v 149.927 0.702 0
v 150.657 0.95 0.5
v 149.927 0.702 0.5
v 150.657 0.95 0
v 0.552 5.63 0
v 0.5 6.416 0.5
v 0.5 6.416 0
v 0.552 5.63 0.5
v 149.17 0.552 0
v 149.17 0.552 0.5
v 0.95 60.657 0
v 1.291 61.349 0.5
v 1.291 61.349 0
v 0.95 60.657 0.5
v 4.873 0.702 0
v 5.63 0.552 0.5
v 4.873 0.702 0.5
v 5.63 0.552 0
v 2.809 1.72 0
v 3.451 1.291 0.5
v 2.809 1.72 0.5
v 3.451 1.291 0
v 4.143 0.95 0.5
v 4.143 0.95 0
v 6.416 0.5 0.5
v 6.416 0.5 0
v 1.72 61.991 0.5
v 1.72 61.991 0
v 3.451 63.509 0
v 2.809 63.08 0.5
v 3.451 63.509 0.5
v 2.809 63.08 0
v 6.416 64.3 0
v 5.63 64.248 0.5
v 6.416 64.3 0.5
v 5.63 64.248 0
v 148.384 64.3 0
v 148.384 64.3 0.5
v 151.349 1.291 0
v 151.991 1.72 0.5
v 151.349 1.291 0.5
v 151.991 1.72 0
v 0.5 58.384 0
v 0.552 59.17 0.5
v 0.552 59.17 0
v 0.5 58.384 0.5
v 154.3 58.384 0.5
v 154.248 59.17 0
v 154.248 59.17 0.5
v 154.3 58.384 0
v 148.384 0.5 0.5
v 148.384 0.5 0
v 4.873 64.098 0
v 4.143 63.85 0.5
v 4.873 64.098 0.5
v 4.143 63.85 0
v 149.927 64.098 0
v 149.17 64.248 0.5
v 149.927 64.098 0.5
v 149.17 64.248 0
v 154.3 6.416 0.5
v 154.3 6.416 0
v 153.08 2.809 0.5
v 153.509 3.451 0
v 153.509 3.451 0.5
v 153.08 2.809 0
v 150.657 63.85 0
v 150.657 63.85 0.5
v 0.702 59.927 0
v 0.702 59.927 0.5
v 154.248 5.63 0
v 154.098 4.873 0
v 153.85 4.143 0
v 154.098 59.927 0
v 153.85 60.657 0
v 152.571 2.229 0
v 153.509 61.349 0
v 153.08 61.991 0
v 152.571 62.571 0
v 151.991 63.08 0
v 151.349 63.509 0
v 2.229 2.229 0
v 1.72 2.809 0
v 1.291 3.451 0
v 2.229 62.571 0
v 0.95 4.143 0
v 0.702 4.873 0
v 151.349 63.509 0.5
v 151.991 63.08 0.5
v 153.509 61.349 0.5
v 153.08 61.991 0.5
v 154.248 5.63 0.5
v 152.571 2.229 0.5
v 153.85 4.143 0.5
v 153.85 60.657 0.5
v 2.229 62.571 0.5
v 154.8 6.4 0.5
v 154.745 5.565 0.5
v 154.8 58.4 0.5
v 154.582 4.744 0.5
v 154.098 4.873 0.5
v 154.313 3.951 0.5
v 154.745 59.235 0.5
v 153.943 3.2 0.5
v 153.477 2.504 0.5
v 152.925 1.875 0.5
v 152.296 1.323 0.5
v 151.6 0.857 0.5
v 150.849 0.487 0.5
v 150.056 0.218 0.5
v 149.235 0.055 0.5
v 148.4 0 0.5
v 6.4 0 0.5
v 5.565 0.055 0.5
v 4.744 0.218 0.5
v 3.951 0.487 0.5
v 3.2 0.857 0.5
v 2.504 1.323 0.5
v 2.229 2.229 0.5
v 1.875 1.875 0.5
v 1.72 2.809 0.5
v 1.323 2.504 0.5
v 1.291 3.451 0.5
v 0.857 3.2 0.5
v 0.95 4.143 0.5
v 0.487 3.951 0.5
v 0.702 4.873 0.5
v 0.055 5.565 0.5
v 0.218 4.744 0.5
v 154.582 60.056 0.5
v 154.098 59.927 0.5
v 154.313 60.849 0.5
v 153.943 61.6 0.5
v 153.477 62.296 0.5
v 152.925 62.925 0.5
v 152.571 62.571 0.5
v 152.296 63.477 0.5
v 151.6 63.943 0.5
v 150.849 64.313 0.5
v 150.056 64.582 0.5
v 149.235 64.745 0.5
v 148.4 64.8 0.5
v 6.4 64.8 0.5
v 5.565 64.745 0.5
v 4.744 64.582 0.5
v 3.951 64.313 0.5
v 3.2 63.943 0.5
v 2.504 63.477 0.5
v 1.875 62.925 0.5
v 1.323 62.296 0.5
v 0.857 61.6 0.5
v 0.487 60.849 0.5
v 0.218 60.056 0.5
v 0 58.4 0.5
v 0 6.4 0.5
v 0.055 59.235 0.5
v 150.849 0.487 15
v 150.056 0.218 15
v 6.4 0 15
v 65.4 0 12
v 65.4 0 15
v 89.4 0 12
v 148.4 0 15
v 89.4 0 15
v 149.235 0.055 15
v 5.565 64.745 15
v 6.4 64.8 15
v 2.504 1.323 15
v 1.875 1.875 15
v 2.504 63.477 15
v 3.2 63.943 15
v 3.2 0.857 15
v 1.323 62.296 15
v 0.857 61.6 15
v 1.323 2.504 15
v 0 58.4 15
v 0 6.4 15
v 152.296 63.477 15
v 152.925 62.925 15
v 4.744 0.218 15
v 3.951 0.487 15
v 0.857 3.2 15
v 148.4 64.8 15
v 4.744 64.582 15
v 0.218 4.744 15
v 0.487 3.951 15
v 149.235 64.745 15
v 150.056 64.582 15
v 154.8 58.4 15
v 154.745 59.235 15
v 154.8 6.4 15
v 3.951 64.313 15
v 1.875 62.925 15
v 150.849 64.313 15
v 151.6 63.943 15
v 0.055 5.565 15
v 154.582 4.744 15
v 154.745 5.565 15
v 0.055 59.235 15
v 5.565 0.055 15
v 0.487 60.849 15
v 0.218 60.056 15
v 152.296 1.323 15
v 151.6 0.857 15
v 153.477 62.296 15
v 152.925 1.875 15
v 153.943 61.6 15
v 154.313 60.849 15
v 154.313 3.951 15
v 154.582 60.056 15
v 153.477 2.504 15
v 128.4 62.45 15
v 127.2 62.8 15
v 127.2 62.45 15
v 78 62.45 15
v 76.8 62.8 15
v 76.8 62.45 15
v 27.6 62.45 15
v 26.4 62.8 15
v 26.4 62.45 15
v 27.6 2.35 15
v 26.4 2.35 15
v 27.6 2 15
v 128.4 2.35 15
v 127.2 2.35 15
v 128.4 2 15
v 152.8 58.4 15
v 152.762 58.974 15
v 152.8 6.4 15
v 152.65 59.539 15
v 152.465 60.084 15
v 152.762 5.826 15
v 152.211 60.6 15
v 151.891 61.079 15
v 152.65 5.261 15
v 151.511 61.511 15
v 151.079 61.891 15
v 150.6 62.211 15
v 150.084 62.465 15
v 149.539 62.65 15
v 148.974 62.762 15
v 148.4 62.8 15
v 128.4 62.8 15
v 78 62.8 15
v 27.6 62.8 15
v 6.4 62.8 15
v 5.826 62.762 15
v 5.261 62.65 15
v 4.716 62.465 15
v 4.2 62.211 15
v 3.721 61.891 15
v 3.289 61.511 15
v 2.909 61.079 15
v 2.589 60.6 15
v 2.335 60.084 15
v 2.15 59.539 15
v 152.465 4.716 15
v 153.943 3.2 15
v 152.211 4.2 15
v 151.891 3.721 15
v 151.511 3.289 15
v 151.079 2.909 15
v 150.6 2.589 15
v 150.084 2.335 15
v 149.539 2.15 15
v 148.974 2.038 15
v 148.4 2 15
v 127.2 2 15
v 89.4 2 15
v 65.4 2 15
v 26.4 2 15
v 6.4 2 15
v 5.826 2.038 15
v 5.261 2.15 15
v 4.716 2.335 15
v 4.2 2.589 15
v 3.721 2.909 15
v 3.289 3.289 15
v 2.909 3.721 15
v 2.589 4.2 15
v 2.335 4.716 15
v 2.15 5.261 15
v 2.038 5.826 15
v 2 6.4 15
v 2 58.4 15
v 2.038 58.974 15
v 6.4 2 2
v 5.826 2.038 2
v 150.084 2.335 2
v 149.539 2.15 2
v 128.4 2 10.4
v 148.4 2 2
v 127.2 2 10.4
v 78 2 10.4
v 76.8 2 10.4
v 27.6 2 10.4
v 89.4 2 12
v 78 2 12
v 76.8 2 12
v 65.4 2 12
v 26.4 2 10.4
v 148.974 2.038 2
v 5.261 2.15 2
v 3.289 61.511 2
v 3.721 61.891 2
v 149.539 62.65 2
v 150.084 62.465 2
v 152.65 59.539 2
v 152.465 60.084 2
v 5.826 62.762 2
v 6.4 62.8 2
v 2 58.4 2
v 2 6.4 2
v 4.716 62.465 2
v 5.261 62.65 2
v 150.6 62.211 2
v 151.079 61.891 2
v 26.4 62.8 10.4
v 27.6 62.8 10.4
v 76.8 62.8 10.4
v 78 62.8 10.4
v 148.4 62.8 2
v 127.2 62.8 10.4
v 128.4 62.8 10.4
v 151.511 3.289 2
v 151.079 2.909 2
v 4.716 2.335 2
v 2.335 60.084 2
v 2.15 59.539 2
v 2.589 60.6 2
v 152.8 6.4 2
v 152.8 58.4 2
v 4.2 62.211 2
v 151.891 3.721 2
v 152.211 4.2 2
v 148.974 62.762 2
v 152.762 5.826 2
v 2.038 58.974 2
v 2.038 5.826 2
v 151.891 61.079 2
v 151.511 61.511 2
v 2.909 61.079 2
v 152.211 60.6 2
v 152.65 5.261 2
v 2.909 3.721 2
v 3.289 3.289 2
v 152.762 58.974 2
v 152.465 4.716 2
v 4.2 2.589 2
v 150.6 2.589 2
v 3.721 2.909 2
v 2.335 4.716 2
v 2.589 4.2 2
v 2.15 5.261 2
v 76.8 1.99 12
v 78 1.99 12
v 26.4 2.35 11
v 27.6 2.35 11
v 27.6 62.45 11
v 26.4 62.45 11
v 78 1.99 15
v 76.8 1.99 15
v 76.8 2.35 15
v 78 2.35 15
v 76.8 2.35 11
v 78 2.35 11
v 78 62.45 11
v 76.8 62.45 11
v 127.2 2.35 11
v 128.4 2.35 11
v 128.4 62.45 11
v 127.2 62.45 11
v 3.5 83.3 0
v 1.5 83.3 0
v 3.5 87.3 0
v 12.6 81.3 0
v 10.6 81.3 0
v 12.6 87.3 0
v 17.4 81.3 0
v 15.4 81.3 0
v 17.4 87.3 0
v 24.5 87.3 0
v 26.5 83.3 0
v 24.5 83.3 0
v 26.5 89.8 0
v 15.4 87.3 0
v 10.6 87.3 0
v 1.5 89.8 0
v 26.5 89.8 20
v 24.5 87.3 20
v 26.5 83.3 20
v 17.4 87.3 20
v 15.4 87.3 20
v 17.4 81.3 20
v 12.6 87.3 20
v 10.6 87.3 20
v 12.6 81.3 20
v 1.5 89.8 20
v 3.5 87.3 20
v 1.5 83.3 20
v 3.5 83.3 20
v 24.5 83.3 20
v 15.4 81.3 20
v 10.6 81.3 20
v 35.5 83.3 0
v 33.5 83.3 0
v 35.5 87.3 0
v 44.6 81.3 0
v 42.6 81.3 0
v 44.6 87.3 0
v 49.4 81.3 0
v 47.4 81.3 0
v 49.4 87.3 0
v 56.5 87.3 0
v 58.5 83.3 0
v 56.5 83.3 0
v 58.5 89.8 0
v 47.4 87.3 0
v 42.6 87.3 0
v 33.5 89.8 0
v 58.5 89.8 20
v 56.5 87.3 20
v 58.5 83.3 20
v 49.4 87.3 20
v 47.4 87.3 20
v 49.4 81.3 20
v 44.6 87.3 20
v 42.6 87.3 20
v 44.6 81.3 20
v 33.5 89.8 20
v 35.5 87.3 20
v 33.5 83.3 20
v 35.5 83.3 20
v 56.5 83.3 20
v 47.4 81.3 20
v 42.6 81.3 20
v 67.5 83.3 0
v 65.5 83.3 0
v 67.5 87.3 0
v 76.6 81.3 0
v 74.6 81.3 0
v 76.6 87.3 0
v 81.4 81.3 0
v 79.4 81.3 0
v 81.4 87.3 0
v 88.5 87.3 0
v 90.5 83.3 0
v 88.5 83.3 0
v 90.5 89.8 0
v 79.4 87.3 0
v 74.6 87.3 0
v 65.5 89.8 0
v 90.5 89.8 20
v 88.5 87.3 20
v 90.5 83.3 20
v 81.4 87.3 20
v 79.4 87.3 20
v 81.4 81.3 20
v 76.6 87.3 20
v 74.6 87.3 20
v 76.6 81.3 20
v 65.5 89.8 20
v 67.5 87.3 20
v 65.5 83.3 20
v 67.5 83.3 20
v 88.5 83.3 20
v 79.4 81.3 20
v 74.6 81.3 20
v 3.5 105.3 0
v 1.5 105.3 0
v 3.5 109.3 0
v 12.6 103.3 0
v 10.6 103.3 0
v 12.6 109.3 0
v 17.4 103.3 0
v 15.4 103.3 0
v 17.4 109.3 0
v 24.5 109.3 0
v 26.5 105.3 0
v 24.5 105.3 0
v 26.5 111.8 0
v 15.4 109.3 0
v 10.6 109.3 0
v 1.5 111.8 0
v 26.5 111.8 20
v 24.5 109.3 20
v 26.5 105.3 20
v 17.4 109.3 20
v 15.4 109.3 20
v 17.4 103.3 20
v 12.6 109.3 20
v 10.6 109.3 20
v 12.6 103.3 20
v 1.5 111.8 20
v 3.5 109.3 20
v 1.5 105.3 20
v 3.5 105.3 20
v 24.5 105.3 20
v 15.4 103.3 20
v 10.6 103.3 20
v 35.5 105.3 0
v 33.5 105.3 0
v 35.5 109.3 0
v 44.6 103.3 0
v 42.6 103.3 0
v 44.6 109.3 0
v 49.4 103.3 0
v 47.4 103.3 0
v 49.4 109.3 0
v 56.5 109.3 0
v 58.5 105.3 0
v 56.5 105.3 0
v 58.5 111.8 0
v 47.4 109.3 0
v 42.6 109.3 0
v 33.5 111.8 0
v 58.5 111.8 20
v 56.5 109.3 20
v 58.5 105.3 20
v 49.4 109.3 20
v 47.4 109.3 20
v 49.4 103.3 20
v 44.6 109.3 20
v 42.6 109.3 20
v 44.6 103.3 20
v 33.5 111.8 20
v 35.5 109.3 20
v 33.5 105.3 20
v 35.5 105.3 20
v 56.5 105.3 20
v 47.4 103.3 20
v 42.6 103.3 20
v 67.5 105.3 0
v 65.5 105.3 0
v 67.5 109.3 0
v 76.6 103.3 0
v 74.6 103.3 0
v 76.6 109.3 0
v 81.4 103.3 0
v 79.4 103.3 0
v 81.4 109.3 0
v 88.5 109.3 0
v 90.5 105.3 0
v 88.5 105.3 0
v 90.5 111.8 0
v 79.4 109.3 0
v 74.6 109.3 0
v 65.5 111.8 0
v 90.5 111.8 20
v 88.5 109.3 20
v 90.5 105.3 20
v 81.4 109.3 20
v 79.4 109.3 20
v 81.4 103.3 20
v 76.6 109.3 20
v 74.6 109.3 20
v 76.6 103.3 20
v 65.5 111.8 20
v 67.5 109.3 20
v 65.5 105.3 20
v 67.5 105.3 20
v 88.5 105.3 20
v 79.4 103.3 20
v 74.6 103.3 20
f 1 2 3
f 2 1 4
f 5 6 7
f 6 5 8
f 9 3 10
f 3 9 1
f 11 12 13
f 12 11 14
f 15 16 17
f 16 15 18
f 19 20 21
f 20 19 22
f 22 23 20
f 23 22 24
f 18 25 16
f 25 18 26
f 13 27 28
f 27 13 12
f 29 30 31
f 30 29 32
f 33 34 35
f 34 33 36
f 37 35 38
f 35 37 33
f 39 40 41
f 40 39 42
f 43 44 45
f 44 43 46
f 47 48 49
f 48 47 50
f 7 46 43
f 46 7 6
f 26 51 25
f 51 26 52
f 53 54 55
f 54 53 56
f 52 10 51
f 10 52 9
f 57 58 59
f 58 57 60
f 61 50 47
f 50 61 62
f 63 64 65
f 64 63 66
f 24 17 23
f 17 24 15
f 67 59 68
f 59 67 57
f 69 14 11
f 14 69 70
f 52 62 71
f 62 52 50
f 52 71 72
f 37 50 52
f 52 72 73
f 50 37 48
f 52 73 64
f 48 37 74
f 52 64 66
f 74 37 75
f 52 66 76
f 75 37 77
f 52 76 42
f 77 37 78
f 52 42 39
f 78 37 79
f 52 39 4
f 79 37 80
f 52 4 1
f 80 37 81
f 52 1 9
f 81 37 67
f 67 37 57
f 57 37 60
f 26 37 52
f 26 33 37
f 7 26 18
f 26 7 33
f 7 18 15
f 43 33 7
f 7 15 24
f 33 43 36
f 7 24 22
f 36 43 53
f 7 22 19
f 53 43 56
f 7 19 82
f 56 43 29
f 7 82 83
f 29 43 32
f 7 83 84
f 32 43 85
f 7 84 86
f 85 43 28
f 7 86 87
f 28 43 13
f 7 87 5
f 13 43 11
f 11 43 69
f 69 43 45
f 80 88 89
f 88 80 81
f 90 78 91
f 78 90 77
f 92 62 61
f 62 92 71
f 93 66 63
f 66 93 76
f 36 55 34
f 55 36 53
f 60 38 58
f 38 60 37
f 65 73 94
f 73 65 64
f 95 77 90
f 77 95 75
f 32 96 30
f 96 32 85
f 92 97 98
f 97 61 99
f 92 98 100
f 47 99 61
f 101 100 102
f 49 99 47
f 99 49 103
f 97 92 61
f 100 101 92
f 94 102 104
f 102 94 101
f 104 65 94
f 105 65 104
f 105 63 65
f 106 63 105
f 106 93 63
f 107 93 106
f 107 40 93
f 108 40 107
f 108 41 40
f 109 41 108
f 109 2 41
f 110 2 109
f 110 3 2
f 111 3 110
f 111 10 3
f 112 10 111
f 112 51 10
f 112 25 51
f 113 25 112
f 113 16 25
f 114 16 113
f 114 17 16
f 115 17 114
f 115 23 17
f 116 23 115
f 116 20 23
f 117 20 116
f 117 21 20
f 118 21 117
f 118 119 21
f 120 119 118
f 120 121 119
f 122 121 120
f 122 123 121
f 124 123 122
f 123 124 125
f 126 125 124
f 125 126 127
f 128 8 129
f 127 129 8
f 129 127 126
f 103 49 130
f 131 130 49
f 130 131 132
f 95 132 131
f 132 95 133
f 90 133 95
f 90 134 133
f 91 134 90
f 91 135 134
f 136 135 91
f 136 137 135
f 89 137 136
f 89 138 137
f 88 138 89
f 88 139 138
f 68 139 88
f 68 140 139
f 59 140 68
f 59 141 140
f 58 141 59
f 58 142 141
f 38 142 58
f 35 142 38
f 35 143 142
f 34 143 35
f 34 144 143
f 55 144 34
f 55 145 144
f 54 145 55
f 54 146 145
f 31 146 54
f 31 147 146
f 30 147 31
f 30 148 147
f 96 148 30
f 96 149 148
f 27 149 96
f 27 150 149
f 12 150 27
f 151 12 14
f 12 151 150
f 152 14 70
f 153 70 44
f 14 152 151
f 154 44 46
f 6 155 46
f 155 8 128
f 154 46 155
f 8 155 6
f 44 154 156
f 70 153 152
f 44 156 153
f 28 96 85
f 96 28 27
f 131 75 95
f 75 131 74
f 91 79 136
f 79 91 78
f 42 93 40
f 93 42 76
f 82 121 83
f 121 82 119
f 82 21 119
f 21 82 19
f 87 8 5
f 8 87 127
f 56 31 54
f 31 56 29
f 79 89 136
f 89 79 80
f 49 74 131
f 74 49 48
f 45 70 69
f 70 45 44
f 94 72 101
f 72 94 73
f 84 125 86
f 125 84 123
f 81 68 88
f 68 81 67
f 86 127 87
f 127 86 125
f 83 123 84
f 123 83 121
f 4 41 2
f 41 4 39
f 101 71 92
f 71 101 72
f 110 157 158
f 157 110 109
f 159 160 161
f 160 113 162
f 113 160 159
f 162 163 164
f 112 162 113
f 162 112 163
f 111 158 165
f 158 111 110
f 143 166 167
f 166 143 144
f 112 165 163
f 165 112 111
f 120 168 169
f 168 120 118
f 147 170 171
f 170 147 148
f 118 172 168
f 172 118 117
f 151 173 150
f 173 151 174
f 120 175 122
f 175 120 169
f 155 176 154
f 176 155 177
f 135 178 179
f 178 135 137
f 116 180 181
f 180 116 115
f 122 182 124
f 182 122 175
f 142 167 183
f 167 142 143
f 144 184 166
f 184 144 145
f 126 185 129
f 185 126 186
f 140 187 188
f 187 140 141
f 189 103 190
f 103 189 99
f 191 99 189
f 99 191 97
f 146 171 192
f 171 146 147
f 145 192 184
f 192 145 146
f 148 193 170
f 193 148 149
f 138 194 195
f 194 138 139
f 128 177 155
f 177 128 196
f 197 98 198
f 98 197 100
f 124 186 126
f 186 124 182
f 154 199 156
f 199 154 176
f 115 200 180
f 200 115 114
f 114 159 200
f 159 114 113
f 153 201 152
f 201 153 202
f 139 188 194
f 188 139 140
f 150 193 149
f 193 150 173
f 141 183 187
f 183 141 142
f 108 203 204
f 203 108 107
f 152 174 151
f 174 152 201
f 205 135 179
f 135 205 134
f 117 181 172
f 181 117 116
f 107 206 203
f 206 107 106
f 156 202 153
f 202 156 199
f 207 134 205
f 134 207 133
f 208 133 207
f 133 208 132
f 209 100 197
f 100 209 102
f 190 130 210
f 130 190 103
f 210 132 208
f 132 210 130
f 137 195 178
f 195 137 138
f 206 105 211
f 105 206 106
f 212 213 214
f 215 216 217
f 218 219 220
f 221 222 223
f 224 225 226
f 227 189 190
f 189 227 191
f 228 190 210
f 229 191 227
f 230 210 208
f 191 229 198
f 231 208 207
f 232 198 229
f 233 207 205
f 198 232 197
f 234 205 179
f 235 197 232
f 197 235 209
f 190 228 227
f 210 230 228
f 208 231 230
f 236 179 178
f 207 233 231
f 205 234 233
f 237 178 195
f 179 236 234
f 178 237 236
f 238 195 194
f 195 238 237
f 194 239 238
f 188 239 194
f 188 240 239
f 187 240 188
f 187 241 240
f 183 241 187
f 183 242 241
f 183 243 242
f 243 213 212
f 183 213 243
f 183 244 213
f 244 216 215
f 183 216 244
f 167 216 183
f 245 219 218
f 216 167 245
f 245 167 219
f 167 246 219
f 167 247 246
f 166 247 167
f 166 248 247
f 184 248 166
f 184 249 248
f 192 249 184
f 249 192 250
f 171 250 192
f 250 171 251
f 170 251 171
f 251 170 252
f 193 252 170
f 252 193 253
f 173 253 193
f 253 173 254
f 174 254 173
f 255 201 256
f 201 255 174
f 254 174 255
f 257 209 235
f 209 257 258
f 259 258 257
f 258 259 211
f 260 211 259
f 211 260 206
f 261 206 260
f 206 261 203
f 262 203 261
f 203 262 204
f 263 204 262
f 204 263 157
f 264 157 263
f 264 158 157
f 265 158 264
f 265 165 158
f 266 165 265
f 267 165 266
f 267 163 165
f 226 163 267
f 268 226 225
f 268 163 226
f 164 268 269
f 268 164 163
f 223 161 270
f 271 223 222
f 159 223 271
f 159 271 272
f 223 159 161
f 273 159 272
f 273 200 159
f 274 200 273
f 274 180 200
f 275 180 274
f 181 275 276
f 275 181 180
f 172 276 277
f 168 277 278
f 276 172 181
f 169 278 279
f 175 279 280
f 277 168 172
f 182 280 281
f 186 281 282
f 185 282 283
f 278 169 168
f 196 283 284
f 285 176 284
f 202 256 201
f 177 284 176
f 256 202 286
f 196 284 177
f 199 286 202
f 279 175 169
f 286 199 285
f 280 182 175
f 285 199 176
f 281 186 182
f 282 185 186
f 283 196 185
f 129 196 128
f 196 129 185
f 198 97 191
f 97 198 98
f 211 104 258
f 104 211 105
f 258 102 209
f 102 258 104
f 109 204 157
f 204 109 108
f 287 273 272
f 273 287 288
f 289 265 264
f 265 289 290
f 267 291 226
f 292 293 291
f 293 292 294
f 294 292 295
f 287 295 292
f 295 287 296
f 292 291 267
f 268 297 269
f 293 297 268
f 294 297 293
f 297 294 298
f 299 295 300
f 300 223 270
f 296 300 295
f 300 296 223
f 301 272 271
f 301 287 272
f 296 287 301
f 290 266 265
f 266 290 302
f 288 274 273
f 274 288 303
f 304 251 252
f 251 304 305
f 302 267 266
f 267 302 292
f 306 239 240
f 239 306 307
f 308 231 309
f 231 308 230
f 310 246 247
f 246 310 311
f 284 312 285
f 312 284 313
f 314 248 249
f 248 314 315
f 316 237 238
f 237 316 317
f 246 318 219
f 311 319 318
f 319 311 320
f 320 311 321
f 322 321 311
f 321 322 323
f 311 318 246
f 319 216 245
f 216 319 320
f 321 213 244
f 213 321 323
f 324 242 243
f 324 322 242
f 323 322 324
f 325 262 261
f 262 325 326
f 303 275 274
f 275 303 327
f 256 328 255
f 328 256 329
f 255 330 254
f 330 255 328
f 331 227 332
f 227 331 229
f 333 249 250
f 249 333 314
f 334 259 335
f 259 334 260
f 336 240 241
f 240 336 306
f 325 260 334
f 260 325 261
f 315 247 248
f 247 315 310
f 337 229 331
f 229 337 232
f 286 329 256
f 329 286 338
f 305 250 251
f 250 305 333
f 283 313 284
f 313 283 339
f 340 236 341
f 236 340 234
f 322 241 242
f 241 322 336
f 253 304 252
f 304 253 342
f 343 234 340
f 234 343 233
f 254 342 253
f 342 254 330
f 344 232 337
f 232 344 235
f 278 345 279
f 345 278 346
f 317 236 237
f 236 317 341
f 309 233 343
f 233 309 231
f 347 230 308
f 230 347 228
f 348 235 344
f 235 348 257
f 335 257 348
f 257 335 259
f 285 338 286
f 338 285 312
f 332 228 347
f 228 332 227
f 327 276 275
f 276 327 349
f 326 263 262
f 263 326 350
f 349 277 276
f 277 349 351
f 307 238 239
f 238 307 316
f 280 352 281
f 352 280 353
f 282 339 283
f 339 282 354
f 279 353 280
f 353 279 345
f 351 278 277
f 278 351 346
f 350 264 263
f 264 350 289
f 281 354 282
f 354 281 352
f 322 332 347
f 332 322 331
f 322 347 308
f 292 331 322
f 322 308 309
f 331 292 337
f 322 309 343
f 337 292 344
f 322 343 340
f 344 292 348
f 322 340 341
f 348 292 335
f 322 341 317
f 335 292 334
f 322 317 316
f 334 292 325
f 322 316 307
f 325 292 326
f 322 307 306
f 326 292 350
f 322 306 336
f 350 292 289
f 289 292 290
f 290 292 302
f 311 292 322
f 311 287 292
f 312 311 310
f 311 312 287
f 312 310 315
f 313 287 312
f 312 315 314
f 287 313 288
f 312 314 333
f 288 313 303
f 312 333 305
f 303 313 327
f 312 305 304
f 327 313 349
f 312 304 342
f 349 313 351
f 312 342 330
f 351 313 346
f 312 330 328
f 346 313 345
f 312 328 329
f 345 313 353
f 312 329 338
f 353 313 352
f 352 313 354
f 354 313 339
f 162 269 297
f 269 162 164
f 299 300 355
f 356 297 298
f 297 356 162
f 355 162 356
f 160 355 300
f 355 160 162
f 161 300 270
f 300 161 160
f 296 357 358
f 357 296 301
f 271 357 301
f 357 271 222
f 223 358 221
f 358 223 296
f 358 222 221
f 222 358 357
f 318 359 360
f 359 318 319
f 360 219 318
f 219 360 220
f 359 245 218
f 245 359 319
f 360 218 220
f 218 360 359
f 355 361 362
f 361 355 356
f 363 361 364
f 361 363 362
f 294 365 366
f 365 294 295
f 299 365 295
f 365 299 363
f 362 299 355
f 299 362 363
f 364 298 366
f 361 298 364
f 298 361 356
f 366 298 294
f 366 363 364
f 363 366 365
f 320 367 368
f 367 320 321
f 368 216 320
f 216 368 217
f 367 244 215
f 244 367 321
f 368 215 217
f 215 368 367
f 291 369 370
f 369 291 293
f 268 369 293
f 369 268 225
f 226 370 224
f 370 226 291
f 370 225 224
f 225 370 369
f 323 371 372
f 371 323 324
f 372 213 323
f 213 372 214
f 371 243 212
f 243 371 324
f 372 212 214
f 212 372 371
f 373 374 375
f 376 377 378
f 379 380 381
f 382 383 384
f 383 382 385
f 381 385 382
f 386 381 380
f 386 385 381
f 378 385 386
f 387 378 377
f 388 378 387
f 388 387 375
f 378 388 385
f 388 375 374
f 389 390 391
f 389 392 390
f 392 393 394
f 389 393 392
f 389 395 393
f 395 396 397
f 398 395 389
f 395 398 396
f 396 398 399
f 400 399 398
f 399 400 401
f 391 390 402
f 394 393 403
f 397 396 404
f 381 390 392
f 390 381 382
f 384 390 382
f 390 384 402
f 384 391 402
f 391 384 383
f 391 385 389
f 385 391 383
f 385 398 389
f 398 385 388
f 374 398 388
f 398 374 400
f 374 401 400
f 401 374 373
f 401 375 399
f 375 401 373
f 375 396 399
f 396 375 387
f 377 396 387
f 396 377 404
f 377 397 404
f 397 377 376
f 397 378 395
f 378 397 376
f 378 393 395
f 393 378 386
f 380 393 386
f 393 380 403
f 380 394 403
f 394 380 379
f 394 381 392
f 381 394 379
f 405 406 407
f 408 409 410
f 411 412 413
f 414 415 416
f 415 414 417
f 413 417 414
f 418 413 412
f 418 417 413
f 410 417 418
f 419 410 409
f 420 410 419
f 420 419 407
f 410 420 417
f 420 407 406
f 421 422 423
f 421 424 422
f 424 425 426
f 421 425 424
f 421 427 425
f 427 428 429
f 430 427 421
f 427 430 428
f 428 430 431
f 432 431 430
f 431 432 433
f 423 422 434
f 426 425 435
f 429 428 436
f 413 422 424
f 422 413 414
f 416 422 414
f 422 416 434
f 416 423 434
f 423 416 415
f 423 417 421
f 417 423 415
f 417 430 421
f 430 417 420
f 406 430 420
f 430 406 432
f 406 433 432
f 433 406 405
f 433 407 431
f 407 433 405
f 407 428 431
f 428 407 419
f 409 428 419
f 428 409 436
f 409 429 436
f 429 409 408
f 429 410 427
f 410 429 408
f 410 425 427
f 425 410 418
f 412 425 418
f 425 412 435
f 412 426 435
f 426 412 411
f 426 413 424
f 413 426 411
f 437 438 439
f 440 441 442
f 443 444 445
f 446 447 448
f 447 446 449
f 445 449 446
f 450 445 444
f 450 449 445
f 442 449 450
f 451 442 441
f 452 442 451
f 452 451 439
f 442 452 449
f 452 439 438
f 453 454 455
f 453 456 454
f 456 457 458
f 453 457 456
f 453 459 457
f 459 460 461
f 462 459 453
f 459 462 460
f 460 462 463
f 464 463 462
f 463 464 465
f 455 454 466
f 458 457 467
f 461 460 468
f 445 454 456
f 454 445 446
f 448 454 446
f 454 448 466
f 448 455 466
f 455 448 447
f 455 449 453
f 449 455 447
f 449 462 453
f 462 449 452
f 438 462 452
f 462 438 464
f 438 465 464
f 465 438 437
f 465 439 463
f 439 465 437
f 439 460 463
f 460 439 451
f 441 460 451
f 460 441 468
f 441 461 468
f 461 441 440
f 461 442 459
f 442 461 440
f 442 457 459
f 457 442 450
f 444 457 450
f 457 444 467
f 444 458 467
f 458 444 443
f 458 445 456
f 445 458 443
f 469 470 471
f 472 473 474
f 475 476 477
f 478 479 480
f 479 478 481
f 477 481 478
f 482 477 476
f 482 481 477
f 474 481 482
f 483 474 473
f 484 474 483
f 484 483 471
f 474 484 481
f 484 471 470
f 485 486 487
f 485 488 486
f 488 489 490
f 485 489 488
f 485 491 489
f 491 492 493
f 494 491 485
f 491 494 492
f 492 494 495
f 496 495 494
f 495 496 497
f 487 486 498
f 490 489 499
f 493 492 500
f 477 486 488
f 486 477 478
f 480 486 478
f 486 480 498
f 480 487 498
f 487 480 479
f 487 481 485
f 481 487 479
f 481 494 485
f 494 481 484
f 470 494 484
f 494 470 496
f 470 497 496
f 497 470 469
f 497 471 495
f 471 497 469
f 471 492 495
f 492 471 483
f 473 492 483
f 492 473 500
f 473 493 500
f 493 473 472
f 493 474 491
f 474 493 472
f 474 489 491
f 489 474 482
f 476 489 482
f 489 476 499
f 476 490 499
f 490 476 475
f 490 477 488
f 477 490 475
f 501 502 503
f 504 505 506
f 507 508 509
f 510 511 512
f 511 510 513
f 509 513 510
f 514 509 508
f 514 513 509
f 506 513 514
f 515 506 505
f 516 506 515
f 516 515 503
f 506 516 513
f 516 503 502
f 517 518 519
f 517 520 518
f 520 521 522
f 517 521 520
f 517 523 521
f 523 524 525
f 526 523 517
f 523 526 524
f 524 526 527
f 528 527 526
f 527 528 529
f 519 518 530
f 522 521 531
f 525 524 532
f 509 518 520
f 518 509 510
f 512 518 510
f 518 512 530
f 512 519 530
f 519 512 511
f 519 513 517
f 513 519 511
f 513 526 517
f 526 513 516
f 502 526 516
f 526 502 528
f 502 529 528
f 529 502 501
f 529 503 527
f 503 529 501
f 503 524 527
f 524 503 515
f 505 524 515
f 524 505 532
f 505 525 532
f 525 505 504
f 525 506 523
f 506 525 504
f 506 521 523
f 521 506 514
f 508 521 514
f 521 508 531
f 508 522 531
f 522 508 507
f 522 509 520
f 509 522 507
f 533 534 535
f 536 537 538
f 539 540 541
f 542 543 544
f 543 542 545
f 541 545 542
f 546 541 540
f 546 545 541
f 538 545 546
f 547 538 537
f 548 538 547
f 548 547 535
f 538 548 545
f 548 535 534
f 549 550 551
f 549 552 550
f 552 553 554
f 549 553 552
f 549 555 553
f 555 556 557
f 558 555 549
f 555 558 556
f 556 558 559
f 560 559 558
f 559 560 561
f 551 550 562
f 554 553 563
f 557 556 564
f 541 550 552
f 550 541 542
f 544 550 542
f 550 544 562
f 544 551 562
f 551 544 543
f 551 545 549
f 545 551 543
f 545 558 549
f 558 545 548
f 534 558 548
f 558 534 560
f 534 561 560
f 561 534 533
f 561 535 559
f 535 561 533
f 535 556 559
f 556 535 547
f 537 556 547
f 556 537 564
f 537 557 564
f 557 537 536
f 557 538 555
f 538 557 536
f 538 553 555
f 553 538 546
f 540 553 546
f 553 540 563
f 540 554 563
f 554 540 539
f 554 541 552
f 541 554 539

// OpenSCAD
// file: params.scad
// ===========================================================================
//  Apache 4800 cyberdeck v2 - shared parameters (all mm)
//  Every part file includes this through parts.scad.
//  Values marked [CHECK] are defaults from the spec: measure the real part and
//  change them here, then run build.cmd again to re-export every STL.
// ===========================================================================

// ---- printer limits --------------------------------------------------------
bed_max    = 175;      // max footprint X and Y
height_max = 150;

// ---- case: Harbor Freight Apache 4800 ---------------------------------------
case_in      = [454, 327];  // interior at the rim (listed)
tray         = [444, 312];  // [CHECK] printed tray outline = floor at the very bottom
tray_r       = 20;          // [CHECK] inside corner radius
base_depth   = 115;         // [CHECK] floor to rim
lid_depth    = 44;          // [CHECK]
height_limit = 100;         // nothing in the base taller than this above the floor

// ---- floor tiles (3 x 2) -----------------------------------------------------
tile_cols = 3;
tile_rows = 2;
tile_t    = 4;
tile_gap  = 0.4;                       // total gap between neighbouring tiles
tile_sz   = [tray[0] / tile_cols, tray[1] / tile_rows];   // 148 x 156
vent_sz     = 15;
vent_pitch  = 25;
vent_margin = 8;                       // keep vents this far from tile edges
chamfer     = 0.5;                     // bottom-edge chamfer (elephant foot)

// ---- tile joints (dovetail tabs printed on the tiles - no loose keys) -------
tab_neck  = 10;      // width where the tab leaves its tile
tab_head  = 16;      // width at the tip (wider = locks)
tab_len   = 10;      // how far it reaches into the next tile
tab_clear = 0.2;     // gap around the tab in the socket (per side); raise if too tight

// ---- Velcro straps ------------------------------------------------------------
strap_w      = 22;   // slot length (20 mm strap + room)
strap_slot_t = 3.5;  // slot width
strap_groove = 1.6;  // groove depth under a floor for the strap (leaves >= 2.4 mm of floor)

// ---- layout (top view; origin = front-left of tray, X right, Y to hinge) ----
// [x0, y0, x1, y1]
hub_box    = [75,   6, 245,  56];
pi_box     = [75,  60, 245, 138];
power_box  = [75, 142, 245, 282];
switch_box = [2.5, 12.5, 72.5, 117.5];
signal_lane = [0, 286, tray[0], 298];
power_lane  = [0, 300, tray[0], 312];

// ---- the PC: Minisforum UM870 Slim (names still say k12 so nothing else breaks) ----
k12      = [130, 126.5, 50.4];    // listed (was GMKtec K12: 154 x 151 x 73.6)
k12_pos  = [266, 40];             // front-left corner on the tray (same spot as the K12)
// [CHECK] open air behind the PC: assumes it blows hot air out the back.
// Once the UM870 is here, check where its vents really are.
rear_air = [k12_pos[0], k12_pos[1] + k12[1], 420, 286];
plinth_margin = 8;
plinth_h      = 15;
plinth_rim    = 8;                // solid border: corner guides sit fully on it
hex_cell      = 10;               // across flats
hex_wall      = 2;
plinth_post_front_h = 20;         // above the honeycomb
plinth_post_rear_h  = 10;         // keep the rear exhaust clear (spec: <= 10)
plinth_post_leg     = 15;
plinth_post_t       = 3;
k12_clear           = 1;
plinth_box = [k12_pos[0] - plinth_margin, k12_pos[1] - plinth_margin,
              k12_pos[0] + k12[0] + plinth_margin, k12_pos[1] + k12[1] + plinth_margin];

// ---- USB hub (Vantisan) -----------------------------------------------------------
hub      = [161, 42, 25];        // measured
hub_fit  = 1;                    // clearance (total)
hub_wall_h       = 16;           // back/side walls above the floor
hub_front_wall_h = 8;            // [CHECK] low front wall: ports face up/front
hub_floor        = 4;
hub_cable_end    = "right";      // cable exit notch end: "right" (toward the PC) or "left"

// ---- Raspberry Pi 5 in CanaKit case ------------------------------------------------
pi_case   = [95, 65, 30];        // measured (height est.)
pi_fit    = 1;
pi_floor  = 4;
pi_guide_h  = 12;
pi_vent_gap = 15;                // open space between Pi and the cable cubby
cubby_wall_h = 15;

// ---- power bay ------------------------------------------------------------------
brick  = [150, 65, 35];          // [CHECK] PC 120 W brick (UM870: 19 V / 6.32 A) - measure it
strip  = [130, 60, 40];          // [CHECK] compact 3-outlet surge strip
power_floor  = 4;
power_wall_h = 30;               // above the floor
power_wall_t = 3;
brick_rib_h  = 4;                // air gap under the brick

// ---- network switch -----------------------------------------------------------------
switch_sz   = [65, 100, 25];     // [CHECK] (X = width, Y = length, ports at back)
switch_fit  = 1;
switch_floor  = 4;
switch_wall_h = 12;

// ---- cable lanes ---------------------------------------------------------------------
rib_h      = 10;
rib_t      = 2.4;
rib_foot_w = 8;
rib_foot_t = 2;
rib_y      = 299;                // centre line between the lanes
comb_w     = 20;                 // comb thickness along the lane

// ---- left-wall side panel -------------------------------------------------------------
panel      = [150, 60];
panel_outer_t = 4;
panel_inner_t = 3;
wall_cutout   = [135, 42];       // [CHECK] must sit inside the flat area of the wall
panel_y_center = 215;            // along the case wall (tray Y)
keystone_hole  = [14.5, 16.0];   // print keystone_test.stl first and adjust
keystone_relief = [17.5, 24];    // back-side pocket so the latch sees a thin plate
keystone_latch_t = 2.0;          // plate thickness where the keystone clips on
keystone_pitch = 19.5;
// Power entry: "iec" = snap-in C14 inlet (recommended - see README) or "slot" = cord slot
power_entry  = "iec";
iec_hole     = [27.5, 19.8];     // [CHECK] snap-in C14 inlet cutout
iec_relief   = [31, 24];
iec_latch_t  = 2.0;
cord_slot    = [25, 12];
m4_hole      = 4.3;
labels = ["LAN", "PC", "MIC", "AUD", "USB", "PWR"];
cover_clear  = 9;                // room in front of the plate for couplers/bolt heads

// ---- lid monitor clips (ViewSonic VA1655) ------------------------------------------------
monitor     = [359, 227];        // listed (spec value used; re-measure the width)
mon_thick   = 20;                // thick edge (measured)
mon_thin    = 10;                // thin edge (measured)
thick_edge  = "bottom";          // [CHECK] "bottom" = hinge side when the lid is open
foam_t      = 1.5;               // foam on every face touching the monitor
clip_wall_t = 3;
clip_lip    = 3;                 // overlap onto the bezel only
clip_lip_t  = 2.5;
clip_buttress = 12;              // VHB foot width outside the wall
clip_leg    = 45;                // leg length along the monitor edge, from the corner
clip_port_leg = 20;              // [CHECK] shorter leg along the RIGHT edge (port zone)

// ---- print settings reference (set these in the slicer) ---------------------------------
// 0.4 nozzle, 0.2 layers, 4 walls, 25-30% gyroid
// holes already include +0.3 mm
$fn = 48;
// main file
// Travel cover (prints top-down) + 6 cable combs (print on their side).
include <parts.scad>
cover_combs_plate();
